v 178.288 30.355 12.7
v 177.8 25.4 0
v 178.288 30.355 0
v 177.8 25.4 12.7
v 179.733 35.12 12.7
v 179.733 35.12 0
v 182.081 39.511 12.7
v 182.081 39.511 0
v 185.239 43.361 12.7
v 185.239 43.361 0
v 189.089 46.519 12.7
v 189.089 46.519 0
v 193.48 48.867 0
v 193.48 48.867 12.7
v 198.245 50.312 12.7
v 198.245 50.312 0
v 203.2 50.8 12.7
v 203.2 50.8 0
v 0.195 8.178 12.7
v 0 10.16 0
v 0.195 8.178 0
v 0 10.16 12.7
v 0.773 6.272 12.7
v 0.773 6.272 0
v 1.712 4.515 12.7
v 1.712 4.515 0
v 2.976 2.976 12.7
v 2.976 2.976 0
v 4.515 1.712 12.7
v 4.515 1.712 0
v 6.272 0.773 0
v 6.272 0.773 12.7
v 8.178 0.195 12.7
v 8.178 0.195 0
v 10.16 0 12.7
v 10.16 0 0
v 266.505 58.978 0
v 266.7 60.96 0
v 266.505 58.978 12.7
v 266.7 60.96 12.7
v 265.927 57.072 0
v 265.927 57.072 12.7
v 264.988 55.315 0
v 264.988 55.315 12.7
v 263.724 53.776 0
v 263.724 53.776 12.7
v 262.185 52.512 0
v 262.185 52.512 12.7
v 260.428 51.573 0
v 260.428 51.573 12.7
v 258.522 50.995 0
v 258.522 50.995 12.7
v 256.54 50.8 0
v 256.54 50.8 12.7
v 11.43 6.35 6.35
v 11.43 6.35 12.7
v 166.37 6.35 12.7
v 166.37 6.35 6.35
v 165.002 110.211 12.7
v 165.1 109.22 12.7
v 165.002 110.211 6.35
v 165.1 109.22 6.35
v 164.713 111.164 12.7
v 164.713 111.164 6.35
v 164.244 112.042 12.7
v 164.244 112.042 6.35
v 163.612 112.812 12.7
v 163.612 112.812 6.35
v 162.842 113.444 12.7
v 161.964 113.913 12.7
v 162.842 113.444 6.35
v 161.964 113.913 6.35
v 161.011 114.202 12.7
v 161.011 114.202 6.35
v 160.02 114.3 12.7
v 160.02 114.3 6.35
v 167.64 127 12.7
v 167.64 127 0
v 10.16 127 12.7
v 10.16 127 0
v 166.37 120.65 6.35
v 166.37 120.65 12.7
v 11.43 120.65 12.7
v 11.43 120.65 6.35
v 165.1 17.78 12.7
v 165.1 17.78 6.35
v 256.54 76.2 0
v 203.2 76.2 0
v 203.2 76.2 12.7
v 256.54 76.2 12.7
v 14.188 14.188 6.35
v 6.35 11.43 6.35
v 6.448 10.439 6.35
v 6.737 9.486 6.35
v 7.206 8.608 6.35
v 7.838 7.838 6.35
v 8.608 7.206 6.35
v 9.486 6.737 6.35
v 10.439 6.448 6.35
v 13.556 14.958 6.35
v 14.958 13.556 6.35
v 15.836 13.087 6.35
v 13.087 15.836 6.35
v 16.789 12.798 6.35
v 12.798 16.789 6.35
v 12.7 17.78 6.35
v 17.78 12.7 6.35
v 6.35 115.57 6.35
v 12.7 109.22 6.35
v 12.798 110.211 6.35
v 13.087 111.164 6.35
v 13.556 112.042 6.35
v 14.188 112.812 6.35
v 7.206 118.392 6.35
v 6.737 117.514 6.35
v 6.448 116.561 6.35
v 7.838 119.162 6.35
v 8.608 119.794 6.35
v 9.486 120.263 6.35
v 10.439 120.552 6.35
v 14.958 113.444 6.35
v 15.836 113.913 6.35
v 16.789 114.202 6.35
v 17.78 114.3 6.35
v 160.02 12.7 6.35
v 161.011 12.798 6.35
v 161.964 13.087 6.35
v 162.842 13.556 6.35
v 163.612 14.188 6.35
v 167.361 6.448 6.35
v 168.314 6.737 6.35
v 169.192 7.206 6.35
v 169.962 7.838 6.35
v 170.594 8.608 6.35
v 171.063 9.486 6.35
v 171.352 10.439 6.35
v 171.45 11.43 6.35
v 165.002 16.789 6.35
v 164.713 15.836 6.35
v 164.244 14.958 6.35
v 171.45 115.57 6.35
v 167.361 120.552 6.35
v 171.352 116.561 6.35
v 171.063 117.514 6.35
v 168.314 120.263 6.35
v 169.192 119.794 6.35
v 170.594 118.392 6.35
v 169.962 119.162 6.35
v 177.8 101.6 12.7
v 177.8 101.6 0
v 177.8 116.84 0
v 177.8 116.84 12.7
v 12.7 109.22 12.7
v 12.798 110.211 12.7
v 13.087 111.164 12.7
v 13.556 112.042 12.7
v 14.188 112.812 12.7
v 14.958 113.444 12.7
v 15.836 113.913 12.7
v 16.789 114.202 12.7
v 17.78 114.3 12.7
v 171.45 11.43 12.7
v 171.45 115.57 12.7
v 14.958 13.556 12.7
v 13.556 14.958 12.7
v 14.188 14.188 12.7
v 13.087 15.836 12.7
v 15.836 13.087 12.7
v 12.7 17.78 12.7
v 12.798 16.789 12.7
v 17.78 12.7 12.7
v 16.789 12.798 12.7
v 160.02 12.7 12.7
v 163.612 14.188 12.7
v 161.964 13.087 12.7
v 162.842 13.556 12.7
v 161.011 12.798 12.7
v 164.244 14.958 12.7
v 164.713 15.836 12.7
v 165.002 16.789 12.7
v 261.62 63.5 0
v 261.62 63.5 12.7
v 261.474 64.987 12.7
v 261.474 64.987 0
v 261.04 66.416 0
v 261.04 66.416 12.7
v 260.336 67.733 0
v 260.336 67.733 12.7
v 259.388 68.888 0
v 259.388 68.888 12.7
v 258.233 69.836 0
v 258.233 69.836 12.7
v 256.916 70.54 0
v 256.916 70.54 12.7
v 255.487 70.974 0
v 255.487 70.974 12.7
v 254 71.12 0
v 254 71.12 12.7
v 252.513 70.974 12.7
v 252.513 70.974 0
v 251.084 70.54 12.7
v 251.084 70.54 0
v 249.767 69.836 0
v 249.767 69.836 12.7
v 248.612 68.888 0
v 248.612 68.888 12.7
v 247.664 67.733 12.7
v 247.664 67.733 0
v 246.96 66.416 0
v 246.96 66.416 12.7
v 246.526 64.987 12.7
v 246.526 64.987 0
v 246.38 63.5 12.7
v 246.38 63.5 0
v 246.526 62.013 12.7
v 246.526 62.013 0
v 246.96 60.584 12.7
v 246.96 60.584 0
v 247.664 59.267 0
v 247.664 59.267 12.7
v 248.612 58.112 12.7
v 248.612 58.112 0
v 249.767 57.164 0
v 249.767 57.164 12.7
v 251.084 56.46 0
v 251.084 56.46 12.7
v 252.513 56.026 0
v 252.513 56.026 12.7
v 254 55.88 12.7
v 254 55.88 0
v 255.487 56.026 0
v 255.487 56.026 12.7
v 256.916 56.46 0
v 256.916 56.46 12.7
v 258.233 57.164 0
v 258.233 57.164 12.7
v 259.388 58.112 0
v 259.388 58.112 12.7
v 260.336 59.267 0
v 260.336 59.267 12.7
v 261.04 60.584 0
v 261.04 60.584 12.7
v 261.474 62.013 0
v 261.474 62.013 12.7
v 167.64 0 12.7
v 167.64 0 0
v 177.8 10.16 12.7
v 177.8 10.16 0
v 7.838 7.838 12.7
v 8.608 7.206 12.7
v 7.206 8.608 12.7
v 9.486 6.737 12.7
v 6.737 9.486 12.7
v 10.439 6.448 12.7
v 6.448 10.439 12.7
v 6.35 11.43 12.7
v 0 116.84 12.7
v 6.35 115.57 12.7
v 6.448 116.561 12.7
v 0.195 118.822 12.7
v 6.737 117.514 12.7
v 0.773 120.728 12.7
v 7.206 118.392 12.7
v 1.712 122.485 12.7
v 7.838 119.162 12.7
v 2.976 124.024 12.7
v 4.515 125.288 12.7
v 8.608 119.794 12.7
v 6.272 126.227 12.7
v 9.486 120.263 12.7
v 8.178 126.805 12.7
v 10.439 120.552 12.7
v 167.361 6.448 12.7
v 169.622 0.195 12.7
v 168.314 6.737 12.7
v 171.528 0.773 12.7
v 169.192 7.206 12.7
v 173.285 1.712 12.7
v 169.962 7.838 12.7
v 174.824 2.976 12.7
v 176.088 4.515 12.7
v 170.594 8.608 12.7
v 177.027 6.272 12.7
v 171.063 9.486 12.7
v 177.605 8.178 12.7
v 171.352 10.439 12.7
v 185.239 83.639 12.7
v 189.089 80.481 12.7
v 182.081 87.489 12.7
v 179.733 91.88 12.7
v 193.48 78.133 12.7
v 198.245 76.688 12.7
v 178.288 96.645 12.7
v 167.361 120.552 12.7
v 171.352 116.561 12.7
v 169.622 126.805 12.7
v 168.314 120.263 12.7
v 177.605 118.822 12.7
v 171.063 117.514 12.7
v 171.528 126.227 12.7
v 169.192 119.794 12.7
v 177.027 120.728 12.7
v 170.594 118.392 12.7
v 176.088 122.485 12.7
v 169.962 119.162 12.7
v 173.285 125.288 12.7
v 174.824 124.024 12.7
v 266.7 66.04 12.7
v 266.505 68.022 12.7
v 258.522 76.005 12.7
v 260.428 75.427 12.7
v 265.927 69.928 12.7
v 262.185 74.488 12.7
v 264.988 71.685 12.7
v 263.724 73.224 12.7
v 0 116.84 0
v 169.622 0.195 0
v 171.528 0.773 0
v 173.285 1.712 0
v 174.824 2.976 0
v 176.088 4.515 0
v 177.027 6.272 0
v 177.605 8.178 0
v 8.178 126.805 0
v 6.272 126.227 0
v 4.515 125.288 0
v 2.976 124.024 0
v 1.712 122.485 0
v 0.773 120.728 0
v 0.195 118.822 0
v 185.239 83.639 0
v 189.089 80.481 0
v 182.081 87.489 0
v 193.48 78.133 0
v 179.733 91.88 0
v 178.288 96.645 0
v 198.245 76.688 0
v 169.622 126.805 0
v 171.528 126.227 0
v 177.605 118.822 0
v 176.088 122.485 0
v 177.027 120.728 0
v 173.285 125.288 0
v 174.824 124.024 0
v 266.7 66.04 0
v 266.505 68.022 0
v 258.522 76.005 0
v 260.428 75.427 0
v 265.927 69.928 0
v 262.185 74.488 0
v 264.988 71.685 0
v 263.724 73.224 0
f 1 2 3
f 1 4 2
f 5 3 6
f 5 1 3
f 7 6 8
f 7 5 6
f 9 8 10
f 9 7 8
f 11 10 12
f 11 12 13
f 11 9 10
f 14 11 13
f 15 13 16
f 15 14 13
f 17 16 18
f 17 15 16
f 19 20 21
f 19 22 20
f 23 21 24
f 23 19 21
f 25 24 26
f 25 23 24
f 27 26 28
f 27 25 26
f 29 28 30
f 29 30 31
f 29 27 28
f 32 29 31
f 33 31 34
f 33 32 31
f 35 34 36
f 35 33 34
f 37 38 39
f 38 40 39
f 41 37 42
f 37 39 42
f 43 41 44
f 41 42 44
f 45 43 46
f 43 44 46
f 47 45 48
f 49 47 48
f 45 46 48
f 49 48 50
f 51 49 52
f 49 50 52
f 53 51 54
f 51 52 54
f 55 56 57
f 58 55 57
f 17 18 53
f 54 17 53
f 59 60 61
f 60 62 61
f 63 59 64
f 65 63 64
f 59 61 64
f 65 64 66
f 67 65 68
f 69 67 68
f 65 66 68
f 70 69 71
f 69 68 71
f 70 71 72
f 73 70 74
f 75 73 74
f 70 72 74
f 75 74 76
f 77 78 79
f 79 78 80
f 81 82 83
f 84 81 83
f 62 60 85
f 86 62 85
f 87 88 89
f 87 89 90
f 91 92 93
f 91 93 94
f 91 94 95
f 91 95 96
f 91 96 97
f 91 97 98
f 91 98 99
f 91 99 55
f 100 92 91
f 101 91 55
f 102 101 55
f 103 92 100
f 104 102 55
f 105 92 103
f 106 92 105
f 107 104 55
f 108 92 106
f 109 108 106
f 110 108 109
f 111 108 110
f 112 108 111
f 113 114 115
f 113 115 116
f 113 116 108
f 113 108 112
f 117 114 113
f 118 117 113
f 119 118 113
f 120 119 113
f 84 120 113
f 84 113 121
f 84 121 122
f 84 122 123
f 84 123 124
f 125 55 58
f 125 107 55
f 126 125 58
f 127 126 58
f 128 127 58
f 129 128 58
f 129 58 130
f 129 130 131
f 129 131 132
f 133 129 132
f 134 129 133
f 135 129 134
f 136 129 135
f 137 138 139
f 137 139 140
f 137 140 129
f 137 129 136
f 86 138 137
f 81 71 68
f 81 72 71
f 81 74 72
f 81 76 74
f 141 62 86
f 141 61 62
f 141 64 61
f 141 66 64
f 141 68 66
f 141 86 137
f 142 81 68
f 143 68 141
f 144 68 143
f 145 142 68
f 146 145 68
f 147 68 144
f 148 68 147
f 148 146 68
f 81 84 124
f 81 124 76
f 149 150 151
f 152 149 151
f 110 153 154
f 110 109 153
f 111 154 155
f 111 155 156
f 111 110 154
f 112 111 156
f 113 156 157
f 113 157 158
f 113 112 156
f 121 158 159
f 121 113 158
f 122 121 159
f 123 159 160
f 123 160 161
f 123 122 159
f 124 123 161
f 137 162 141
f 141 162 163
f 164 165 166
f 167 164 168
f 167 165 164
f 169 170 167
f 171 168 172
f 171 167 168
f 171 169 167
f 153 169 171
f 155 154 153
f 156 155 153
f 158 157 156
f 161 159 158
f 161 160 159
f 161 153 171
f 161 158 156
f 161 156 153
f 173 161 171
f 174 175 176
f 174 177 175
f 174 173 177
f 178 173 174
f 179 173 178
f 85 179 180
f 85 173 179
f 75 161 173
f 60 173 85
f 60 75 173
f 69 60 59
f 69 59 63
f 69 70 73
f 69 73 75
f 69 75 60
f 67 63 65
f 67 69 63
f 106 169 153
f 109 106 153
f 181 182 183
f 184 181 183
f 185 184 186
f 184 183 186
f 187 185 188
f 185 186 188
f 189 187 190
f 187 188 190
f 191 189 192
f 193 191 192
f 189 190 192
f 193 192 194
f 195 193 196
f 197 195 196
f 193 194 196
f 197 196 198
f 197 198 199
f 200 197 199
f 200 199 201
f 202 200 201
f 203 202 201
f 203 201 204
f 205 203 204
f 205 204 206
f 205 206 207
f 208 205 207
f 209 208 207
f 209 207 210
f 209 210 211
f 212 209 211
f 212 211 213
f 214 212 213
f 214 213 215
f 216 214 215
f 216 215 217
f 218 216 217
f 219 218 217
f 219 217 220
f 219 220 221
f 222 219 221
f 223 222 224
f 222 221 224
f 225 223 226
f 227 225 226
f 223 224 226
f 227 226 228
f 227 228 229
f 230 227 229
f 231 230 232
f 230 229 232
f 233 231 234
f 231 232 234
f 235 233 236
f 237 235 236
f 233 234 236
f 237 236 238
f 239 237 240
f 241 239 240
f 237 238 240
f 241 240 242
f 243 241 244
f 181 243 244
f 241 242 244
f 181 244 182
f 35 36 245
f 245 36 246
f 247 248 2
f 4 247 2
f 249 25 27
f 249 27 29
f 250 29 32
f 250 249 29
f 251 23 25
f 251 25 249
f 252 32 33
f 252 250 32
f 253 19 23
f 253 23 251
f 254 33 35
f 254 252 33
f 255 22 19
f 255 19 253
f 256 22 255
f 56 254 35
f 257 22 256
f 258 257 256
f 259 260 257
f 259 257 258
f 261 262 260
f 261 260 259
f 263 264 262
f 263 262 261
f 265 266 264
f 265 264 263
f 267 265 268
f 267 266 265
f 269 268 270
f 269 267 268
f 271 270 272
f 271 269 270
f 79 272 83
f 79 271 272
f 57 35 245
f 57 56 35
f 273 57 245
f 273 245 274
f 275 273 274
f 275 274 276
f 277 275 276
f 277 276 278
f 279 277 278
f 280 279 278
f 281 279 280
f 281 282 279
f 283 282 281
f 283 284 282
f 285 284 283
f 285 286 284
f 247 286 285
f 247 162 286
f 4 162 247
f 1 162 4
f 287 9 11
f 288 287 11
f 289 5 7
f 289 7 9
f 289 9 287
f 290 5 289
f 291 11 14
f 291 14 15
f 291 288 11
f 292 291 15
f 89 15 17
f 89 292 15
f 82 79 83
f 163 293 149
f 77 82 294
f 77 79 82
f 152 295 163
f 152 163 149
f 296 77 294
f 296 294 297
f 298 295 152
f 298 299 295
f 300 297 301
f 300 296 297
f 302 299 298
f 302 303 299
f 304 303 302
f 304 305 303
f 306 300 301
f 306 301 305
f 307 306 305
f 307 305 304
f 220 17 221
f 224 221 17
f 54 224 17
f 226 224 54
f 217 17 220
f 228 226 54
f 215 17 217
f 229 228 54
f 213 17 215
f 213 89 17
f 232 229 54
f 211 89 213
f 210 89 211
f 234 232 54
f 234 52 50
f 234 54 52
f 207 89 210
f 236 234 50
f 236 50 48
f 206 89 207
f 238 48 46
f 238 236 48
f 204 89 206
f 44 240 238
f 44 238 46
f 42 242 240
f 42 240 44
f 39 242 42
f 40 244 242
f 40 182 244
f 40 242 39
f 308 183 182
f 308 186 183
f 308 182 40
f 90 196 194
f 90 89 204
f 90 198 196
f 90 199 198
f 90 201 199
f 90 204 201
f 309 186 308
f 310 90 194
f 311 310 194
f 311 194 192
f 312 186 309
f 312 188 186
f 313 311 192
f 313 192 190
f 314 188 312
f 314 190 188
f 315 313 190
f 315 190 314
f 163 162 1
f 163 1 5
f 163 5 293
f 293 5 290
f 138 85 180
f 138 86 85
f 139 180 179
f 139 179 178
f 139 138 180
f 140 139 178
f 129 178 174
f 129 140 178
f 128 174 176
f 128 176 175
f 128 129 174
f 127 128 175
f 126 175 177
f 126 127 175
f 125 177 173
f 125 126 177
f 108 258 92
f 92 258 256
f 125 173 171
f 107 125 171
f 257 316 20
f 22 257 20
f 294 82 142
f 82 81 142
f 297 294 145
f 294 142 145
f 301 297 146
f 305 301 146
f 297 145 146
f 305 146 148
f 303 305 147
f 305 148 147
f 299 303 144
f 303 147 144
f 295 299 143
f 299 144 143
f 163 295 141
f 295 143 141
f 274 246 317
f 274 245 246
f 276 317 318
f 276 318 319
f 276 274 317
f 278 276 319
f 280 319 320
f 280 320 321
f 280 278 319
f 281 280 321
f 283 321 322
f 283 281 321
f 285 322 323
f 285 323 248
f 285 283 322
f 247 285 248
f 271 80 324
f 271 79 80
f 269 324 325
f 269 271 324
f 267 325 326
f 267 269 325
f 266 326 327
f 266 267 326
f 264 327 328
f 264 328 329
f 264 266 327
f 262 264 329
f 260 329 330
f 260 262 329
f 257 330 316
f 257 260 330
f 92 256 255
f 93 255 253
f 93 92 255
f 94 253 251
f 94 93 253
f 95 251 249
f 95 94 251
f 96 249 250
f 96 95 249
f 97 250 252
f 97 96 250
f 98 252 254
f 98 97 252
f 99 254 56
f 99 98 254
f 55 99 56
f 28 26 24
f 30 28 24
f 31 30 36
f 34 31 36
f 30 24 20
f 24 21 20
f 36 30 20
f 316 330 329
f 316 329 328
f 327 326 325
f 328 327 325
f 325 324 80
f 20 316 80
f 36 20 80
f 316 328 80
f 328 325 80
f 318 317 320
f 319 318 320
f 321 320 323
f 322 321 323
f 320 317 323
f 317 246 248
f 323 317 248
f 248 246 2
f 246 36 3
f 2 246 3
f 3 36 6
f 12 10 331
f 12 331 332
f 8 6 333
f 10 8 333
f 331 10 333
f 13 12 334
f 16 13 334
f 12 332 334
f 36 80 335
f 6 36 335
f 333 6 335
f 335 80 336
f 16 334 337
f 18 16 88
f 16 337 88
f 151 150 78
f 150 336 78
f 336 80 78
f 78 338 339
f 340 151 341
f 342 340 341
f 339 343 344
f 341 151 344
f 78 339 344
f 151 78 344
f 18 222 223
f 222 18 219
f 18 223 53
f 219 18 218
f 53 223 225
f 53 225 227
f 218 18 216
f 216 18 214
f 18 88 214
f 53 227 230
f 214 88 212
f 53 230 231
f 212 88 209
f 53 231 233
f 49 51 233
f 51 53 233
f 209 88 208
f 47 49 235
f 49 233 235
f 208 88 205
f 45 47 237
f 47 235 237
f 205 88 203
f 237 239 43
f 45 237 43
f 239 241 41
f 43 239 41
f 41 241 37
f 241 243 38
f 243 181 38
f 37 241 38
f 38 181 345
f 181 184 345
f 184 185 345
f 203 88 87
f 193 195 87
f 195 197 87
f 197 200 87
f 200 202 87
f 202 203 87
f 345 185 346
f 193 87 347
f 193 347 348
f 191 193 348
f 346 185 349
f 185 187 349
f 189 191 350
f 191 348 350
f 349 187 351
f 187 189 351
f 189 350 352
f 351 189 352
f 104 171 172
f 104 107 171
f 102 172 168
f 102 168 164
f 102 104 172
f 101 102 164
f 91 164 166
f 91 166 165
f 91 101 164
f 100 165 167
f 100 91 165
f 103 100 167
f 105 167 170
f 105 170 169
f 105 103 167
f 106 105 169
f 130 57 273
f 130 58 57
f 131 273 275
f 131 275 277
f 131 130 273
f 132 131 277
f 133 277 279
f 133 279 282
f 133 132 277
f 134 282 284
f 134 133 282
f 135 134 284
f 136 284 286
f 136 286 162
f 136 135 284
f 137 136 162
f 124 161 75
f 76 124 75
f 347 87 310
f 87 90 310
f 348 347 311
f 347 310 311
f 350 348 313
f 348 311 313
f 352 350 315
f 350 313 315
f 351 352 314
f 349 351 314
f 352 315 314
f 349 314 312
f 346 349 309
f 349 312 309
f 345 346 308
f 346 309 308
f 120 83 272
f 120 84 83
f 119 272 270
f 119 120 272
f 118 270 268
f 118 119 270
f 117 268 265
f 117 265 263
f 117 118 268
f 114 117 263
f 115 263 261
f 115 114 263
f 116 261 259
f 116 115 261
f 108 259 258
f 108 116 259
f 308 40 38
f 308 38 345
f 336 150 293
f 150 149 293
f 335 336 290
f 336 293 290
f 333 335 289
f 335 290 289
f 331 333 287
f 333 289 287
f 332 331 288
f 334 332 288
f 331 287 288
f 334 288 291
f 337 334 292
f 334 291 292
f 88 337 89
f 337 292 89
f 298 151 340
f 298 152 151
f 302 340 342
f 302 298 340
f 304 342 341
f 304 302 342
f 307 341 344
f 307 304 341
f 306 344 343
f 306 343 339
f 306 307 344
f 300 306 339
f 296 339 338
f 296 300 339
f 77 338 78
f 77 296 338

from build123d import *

# Parameters (mm, degrees)
F0_W     = 88.9
F0_H     = 25.4
F1_DEPTH = 12.7
F2_R     = 7.62
F3_DEPTH = 48.26
F5_DEPTH = 6.35
F6_R     = 5.08
F7_R     = 25.4
F8_R     = 10.16


with BuildPart() as f1:
    # F0 (on Top) → F1 (new body)
    with BuildSketch(Plane.XY):
        Polygon((0, 127), (0, 0), (177.8, 0), (177.8, 50.8), (177.8, 76.2), (177.8, 127), align=None)
        with Locations((222.25, 63.5)):
            Rectangle(F0_W, F0_H)
    extrude(amount=F1_DEPTH)

    # F2 (on face) → F3 (cut)
    with BuildSketch(Plane.XY.offset(12.7)):
        with Locations((254, 63.5)):
            Circle(F2_R)
    extrude(amount=-F3_DEPTH, mode=Mode.SUBTRACT)

    # F4 (on face) → F5 (cut)
    with BuildSketch(Plane.XY.offset(12.7)):
        Polygon((171.45, 120.65), (6.35, 120.65), (6.35, 6.35), (171.45, 6.35), (171.45, 50.8), (171.45, 76.2), align=None)
        Polygon((165.1, 12.7), (12.7, 12.7), (12.7, 114.3), (165.1, 114.3), (165.1, 76.2), (165.1, 50.8), align=None, mode=Mode.SUBTRACT)
    extrude(amount=-F5_DEPTH, mode=Mode.SUBTRACT)

    # F6
    f6_edges = [f1.edges().sort_by_distance(p)[0] for p in [
        (6.35, 6.35, 9.525),
        (171.45, 6.35, 9.525),
        (171.45, 120.65, 9.525),
        (6.35, 120.65, 9.525),
        (165.1, 12.7, 9.525),
        (165.1, 114.3, 9.525),
        (12.7, 114.3, 9.525),
        (12.7, 12.7, 9.525),
    ]]
    fillet(f6_edges, radius=F6_R)

    # F7
    f7_edges = [f1.edges().sort_by_distance(p)[0] for p in [
        (177.8, 50.8, 6.35),
        (177.8, 76.2, 6.35),
    ]]
    fillet(f7_edges, radius=F7_R)

    # F8
    f8_edges = [f1.edges().sort_by_distance(p)[0] for p in [
        (266.7, 50.8, 6.35),
        (266.7, 76.2, 6.35),
        (177.8, 0, 6.35),
        (177.8, 127, 6.35),
        (0, 127, 6.35),
        (0, 0, 6.35),
    ]]
    fillet(f8_edges, radius=F8_R)


solid = f1.part
